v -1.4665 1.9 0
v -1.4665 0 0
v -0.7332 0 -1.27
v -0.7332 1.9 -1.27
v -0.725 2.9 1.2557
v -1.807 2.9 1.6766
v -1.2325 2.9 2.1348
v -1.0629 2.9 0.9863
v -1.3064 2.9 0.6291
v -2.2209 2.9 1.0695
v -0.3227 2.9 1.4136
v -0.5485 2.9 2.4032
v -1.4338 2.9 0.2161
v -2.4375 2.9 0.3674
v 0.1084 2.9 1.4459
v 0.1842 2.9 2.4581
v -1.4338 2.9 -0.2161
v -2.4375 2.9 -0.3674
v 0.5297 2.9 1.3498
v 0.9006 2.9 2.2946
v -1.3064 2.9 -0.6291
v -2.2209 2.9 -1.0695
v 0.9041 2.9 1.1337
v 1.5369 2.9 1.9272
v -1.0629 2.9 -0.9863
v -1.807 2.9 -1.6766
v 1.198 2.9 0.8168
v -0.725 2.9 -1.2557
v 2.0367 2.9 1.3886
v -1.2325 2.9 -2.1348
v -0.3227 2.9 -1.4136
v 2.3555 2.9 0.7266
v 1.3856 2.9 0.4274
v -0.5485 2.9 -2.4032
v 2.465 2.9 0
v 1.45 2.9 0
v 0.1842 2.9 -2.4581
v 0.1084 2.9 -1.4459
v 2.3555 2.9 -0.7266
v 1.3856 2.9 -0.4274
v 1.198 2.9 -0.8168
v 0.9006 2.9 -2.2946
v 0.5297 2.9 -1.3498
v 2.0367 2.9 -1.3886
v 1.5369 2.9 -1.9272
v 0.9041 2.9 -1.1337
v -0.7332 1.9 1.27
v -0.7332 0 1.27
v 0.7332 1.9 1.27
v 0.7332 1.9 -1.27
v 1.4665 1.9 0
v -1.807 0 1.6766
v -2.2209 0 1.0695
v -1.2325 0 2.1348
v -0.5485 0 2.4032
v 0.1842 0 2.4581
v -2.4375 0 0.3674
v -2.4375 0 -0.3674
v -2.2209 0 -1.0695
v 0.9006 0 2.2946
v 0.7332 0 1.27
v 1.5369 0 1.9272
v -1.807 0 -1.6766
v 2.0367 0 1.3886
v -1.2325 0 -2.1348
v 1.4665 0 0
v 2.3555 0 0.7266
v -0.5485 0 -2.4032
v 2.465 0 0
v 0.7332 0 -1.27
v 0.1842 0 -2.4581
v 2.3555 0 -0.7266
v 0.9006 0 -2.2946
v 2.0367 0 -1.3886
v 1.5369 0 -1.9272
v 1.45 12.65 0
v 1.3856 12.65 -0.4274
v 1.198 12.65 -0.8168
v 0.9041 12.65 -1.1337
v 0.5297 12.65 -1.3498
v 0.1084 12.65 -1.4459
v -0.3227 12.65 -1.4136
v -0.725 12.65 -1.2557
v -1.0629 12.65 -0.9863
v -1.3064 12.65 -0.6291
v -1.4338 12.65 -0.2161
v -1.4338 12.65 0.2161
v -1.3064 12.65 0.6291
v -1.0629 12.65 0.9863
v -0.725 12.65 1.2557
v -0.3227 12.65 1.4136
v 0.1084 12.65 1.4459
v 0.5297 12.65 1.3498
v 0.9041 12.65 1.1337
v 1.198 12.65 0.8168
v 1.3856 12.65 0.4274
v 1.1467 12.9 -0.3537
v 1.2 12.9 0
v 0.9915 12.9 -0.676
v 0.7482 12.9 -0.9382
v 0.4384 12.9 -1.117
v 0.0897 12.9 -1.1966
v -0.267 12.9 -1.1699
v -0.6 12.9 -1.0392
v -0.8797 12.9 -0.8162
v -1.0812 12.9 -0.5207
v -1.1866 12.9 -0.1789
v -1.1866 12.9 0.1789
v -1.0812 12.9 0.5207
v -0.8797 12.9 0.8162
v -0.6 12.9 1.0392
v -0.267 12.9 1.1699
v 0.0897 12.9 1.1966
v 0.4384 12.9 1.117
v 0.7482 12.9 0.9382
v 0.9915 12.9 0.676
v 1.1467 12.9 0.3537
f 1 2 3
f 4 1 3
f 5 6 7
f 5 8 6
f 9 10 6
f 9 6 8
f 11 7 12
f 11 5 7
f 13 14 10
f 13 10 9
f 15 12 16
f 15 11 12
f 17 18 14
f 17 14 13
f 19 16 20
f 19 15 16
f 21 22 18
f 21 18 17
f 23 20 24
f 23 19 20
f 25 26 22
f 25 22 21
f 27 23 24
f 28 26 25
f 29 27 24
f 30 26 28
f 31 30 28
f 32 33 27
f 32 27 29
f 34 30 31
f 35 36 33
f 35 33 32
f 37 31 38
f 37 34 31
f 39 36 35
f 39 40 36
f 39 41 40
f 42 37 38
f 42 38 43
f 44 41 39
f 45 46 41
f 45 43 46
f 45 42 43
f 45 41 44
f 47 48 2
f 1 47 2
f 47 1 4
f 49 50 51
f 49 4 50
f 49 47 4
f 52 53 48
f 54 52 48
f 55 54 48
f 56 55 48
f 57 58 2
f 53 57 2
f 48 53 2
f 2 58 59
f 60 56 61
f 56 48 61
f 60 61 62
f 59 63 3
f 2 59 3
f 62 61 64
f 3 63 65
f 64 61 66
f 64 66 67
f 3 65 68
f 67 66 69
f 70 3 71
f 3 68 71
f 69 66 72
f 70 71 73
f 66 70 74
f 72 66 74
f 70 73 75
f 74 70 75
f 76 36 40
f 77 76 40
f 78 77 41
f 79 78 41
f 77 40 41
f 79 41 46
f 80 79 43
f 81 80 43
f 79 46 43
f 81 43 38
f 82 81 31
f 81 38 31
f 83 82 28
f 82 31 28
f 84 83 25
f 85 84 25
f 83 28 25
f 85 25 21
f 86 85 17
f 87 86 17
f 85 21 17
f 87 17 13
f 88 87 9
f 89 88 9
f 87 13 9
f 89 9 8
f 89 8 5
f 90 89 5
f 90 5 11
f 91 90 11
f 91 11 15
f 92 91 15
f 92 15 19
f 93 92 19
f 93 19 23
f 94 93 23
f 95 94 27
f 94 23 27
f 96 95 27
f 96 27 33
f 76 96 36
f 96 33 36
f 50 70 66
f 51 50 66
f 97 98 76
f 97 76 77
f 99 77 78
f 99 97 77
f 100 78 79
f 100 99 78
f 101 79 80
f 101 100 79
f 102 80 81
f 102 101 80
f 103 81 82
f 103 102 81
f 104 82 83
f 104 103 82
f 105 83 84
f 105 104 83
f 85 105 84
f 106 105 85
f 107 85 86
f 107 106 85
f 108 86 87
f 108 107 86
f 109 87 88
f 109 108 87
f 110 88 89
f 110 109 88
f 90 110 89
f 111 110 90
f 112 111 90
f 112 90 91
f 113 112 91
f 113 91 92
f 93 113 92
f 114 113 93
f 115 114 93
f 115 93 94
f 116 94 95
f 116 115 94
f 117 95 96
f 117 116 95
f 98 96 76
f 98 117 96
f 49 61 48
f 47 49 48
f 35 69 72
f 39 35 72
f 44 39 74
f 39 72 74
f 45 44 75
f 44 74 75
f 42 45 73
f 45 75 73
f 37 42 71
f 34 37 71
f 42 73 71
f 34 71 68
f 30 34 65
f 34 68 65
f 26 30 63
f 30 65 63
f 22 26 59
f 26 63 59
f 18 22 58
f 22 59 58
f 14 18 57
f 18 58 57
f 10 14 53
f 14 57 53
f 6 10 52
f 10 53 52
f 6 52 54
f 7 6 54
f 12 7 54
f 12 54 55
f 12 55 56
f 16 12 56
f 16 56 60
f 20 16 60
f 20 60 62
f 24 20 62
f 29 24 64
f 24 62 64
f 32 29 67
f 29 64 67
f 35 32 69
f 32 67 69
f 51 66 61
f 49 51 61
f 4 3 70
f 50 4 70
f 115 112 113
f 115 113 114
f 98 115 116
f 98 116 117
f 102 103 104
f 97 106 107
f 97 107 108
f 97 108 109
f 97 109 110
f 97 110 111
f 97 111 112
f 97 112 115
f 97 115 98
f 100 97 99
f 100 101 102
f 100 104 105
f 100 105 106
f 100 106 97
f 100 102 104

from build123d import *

# Parameters (mm, degrees)
SKETCH1_R           = 2.465
BOSS_EXTRUDE1_DEPTH = 2.9
SKETCH2_R           = 1.45
BOSS_EXTRUDE2_DEPTH = 10
CUT_EXTRUDE1_DEPTH  = 1.9
CHAMFER1_SIZE       = 0.25


with BuildPart() as part:
    # Sketch1 → Boss-Extrude1 (new body)
    with BuildSketch(Plane(origin=(0, 0, 0), x_dir=(1, 0, 0), z_dir=(0, 1, 0))):
        Circle(SKETCH1_R)
    extrude(amount=BOSS_EXTRUDE1_DEPTH)

    # Sketch2 → Boss-Extrude2 (add)
    with BuildSketch(Plane(origin=(0, 2.9, 0), x_dir=(1, 0, 0), z_dir=(0, 1, 0))):
        Circle(SKETCH2_R)
    extrude(amount=BOSS_EXTRUDE2_DEPTH)

    # Sketch3 → Cut-Extrude1 (cut)
    with BuildSketch(Plane.XZ):
        Polygon((0.733234842, -1.27), (1.466469684, 0), (0.733234842, 1.27), (-0.733234842, 1.27), (-1.466469684, 0), (-0.733234842, -1.27), align=None)
    extrude(amount=-CUT_EXTRUDE1_DEPTH, mode=Mode.SUBTRACT)

    # Chamfer1
    chamfer1_edges = [part.edges().sort_by_distance(p)[0] for p in [
        (-1.45, 12.9, 0),
    ]]
    chamfer(chamfer1_edges, length=CHAMFER1_SIZE)


solid = part.part
